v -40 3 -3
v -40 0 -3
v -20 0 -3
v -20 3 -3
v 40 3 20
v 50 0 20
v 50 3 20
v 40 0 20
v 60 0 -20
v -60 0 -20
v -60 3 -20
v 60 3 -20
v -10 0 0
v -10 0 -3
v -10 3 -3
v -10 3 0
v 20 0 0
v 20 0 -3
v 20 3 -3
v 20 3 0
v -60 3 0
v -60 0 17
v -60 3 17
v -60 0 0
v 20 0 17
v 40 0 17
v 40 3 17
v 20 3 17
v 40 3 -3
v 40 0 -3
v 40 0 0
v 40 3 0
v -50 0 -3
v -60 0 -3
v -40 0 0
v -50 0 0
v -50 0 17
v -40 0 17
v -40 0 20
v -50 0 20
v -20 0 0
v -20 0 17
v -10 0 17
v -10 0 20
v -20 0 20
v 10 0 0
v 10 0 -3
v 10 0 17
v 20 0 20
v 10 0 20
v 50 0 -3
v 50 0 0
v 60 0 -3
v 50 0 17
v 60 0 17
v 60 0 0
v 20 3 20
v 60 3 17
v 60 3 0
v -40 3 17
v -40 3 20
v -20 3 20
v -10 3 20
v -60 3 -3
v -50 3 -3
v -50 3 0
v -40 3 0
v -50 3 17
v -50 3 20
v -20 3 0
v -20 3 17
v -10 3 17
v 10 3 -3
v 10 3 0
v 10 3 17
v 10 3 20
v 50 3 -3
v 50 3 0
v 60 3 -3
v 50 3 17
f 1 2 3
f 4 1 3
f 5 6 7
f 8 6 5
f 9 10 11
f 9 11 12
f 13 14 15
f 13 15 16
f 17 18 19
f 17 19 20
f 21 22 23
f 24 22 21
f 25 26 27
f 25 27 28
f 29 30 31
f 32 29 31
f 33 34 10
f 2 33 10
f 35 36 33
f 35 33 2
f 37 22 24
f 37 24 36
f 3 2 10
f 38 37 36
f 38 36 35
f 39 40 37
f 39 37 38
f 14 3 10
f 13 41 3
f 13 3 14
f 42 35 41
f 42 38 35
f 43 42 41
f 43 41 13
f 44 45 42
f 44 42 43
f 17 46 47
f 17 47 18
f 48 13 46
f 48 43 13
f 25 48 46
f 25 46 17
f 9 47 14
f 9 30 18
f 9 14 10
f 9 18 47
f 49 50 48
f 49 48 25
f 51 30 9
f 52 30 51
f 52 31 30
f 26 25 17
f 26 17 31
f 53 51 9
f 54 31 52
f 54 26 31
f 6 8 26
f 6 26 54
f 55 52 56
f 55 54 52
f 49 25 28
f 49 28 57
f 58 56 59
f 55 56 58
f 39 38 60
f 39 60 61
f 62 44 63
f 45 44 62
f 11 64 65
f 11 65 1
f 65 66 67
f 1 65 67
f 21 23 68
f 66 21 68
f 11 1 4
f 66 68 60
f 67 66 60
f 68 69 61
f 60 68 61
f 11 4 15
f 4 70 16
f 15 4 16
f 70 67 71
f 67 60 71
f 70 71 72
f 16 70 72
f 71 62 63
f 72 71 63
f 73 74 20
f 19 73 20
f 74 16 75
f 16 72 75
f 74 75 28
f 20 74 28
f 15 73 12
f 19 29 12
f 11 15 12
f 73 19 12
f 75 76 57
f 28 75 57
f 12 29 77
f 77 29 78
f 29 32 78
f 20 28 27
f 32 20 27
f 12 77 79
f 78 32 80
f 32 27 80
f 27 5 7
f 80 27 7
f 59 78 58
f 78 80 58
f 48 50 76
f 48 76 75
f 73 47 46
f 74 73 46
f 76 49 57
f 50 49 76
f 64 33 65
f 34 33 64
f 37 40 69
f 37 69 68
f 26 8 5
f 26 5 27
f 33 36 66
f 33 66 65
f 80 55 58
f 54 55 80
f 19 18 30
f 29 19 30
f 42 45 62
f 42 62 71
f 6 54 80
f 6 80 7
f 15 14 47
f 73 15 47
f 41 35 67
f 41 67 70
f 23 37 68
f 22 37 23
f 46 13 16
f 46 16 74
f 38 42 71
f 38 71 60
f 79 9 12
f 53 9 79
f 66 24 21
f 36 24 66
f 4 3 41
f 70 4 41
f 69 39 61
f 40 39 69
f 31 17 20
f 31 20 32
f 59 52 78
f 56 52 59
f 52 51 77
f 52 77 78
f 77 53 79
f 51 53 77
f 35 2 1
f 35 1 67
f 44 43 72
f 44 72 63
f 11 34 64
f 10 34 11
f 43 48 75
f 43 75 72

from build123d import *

# Parameters (mm, degrees)
F1_W     = 20
F1_H     = 3
F2_DEPTH = 3


with BuildPart() as f2:
    # F1 (on Front) → F2 (new body)
    with BuildSketch(Plane.XZ):
        Polygon((-60, -20), (60, -20), (60, -3), (50, -3), (50, 0), (60, 0), (60, 17), (50, 17), (50, 20), (40, 20), (40, 17), (20, 17), (20, 20), (10, 20), (10, 17), (-10, 17), (-10, 20), (-20, 20), (-20, 17), (-40, 17), (-40, 20), (-50, 20), (-50, 17), (-60, 17), (-60, 0), (-50, 0), (-50, -3), (-60, -3), align=None)
        with Locations((-30, -1.5)):
            Rectangle(F1_W, F1_H, mode=Mode.SUBTRACT)
        with Locations((0, -1.5)):
            Rectangle(F1_W, F1_H, mode=Mode.SUBTRACT)
        with Locations((30, -1.5)):
            Rectangle(F1_W, F1_H, mode=Mode.SUBTRACT)
    extrude(amount=-F2_DEPTH)


solid = f2.part
